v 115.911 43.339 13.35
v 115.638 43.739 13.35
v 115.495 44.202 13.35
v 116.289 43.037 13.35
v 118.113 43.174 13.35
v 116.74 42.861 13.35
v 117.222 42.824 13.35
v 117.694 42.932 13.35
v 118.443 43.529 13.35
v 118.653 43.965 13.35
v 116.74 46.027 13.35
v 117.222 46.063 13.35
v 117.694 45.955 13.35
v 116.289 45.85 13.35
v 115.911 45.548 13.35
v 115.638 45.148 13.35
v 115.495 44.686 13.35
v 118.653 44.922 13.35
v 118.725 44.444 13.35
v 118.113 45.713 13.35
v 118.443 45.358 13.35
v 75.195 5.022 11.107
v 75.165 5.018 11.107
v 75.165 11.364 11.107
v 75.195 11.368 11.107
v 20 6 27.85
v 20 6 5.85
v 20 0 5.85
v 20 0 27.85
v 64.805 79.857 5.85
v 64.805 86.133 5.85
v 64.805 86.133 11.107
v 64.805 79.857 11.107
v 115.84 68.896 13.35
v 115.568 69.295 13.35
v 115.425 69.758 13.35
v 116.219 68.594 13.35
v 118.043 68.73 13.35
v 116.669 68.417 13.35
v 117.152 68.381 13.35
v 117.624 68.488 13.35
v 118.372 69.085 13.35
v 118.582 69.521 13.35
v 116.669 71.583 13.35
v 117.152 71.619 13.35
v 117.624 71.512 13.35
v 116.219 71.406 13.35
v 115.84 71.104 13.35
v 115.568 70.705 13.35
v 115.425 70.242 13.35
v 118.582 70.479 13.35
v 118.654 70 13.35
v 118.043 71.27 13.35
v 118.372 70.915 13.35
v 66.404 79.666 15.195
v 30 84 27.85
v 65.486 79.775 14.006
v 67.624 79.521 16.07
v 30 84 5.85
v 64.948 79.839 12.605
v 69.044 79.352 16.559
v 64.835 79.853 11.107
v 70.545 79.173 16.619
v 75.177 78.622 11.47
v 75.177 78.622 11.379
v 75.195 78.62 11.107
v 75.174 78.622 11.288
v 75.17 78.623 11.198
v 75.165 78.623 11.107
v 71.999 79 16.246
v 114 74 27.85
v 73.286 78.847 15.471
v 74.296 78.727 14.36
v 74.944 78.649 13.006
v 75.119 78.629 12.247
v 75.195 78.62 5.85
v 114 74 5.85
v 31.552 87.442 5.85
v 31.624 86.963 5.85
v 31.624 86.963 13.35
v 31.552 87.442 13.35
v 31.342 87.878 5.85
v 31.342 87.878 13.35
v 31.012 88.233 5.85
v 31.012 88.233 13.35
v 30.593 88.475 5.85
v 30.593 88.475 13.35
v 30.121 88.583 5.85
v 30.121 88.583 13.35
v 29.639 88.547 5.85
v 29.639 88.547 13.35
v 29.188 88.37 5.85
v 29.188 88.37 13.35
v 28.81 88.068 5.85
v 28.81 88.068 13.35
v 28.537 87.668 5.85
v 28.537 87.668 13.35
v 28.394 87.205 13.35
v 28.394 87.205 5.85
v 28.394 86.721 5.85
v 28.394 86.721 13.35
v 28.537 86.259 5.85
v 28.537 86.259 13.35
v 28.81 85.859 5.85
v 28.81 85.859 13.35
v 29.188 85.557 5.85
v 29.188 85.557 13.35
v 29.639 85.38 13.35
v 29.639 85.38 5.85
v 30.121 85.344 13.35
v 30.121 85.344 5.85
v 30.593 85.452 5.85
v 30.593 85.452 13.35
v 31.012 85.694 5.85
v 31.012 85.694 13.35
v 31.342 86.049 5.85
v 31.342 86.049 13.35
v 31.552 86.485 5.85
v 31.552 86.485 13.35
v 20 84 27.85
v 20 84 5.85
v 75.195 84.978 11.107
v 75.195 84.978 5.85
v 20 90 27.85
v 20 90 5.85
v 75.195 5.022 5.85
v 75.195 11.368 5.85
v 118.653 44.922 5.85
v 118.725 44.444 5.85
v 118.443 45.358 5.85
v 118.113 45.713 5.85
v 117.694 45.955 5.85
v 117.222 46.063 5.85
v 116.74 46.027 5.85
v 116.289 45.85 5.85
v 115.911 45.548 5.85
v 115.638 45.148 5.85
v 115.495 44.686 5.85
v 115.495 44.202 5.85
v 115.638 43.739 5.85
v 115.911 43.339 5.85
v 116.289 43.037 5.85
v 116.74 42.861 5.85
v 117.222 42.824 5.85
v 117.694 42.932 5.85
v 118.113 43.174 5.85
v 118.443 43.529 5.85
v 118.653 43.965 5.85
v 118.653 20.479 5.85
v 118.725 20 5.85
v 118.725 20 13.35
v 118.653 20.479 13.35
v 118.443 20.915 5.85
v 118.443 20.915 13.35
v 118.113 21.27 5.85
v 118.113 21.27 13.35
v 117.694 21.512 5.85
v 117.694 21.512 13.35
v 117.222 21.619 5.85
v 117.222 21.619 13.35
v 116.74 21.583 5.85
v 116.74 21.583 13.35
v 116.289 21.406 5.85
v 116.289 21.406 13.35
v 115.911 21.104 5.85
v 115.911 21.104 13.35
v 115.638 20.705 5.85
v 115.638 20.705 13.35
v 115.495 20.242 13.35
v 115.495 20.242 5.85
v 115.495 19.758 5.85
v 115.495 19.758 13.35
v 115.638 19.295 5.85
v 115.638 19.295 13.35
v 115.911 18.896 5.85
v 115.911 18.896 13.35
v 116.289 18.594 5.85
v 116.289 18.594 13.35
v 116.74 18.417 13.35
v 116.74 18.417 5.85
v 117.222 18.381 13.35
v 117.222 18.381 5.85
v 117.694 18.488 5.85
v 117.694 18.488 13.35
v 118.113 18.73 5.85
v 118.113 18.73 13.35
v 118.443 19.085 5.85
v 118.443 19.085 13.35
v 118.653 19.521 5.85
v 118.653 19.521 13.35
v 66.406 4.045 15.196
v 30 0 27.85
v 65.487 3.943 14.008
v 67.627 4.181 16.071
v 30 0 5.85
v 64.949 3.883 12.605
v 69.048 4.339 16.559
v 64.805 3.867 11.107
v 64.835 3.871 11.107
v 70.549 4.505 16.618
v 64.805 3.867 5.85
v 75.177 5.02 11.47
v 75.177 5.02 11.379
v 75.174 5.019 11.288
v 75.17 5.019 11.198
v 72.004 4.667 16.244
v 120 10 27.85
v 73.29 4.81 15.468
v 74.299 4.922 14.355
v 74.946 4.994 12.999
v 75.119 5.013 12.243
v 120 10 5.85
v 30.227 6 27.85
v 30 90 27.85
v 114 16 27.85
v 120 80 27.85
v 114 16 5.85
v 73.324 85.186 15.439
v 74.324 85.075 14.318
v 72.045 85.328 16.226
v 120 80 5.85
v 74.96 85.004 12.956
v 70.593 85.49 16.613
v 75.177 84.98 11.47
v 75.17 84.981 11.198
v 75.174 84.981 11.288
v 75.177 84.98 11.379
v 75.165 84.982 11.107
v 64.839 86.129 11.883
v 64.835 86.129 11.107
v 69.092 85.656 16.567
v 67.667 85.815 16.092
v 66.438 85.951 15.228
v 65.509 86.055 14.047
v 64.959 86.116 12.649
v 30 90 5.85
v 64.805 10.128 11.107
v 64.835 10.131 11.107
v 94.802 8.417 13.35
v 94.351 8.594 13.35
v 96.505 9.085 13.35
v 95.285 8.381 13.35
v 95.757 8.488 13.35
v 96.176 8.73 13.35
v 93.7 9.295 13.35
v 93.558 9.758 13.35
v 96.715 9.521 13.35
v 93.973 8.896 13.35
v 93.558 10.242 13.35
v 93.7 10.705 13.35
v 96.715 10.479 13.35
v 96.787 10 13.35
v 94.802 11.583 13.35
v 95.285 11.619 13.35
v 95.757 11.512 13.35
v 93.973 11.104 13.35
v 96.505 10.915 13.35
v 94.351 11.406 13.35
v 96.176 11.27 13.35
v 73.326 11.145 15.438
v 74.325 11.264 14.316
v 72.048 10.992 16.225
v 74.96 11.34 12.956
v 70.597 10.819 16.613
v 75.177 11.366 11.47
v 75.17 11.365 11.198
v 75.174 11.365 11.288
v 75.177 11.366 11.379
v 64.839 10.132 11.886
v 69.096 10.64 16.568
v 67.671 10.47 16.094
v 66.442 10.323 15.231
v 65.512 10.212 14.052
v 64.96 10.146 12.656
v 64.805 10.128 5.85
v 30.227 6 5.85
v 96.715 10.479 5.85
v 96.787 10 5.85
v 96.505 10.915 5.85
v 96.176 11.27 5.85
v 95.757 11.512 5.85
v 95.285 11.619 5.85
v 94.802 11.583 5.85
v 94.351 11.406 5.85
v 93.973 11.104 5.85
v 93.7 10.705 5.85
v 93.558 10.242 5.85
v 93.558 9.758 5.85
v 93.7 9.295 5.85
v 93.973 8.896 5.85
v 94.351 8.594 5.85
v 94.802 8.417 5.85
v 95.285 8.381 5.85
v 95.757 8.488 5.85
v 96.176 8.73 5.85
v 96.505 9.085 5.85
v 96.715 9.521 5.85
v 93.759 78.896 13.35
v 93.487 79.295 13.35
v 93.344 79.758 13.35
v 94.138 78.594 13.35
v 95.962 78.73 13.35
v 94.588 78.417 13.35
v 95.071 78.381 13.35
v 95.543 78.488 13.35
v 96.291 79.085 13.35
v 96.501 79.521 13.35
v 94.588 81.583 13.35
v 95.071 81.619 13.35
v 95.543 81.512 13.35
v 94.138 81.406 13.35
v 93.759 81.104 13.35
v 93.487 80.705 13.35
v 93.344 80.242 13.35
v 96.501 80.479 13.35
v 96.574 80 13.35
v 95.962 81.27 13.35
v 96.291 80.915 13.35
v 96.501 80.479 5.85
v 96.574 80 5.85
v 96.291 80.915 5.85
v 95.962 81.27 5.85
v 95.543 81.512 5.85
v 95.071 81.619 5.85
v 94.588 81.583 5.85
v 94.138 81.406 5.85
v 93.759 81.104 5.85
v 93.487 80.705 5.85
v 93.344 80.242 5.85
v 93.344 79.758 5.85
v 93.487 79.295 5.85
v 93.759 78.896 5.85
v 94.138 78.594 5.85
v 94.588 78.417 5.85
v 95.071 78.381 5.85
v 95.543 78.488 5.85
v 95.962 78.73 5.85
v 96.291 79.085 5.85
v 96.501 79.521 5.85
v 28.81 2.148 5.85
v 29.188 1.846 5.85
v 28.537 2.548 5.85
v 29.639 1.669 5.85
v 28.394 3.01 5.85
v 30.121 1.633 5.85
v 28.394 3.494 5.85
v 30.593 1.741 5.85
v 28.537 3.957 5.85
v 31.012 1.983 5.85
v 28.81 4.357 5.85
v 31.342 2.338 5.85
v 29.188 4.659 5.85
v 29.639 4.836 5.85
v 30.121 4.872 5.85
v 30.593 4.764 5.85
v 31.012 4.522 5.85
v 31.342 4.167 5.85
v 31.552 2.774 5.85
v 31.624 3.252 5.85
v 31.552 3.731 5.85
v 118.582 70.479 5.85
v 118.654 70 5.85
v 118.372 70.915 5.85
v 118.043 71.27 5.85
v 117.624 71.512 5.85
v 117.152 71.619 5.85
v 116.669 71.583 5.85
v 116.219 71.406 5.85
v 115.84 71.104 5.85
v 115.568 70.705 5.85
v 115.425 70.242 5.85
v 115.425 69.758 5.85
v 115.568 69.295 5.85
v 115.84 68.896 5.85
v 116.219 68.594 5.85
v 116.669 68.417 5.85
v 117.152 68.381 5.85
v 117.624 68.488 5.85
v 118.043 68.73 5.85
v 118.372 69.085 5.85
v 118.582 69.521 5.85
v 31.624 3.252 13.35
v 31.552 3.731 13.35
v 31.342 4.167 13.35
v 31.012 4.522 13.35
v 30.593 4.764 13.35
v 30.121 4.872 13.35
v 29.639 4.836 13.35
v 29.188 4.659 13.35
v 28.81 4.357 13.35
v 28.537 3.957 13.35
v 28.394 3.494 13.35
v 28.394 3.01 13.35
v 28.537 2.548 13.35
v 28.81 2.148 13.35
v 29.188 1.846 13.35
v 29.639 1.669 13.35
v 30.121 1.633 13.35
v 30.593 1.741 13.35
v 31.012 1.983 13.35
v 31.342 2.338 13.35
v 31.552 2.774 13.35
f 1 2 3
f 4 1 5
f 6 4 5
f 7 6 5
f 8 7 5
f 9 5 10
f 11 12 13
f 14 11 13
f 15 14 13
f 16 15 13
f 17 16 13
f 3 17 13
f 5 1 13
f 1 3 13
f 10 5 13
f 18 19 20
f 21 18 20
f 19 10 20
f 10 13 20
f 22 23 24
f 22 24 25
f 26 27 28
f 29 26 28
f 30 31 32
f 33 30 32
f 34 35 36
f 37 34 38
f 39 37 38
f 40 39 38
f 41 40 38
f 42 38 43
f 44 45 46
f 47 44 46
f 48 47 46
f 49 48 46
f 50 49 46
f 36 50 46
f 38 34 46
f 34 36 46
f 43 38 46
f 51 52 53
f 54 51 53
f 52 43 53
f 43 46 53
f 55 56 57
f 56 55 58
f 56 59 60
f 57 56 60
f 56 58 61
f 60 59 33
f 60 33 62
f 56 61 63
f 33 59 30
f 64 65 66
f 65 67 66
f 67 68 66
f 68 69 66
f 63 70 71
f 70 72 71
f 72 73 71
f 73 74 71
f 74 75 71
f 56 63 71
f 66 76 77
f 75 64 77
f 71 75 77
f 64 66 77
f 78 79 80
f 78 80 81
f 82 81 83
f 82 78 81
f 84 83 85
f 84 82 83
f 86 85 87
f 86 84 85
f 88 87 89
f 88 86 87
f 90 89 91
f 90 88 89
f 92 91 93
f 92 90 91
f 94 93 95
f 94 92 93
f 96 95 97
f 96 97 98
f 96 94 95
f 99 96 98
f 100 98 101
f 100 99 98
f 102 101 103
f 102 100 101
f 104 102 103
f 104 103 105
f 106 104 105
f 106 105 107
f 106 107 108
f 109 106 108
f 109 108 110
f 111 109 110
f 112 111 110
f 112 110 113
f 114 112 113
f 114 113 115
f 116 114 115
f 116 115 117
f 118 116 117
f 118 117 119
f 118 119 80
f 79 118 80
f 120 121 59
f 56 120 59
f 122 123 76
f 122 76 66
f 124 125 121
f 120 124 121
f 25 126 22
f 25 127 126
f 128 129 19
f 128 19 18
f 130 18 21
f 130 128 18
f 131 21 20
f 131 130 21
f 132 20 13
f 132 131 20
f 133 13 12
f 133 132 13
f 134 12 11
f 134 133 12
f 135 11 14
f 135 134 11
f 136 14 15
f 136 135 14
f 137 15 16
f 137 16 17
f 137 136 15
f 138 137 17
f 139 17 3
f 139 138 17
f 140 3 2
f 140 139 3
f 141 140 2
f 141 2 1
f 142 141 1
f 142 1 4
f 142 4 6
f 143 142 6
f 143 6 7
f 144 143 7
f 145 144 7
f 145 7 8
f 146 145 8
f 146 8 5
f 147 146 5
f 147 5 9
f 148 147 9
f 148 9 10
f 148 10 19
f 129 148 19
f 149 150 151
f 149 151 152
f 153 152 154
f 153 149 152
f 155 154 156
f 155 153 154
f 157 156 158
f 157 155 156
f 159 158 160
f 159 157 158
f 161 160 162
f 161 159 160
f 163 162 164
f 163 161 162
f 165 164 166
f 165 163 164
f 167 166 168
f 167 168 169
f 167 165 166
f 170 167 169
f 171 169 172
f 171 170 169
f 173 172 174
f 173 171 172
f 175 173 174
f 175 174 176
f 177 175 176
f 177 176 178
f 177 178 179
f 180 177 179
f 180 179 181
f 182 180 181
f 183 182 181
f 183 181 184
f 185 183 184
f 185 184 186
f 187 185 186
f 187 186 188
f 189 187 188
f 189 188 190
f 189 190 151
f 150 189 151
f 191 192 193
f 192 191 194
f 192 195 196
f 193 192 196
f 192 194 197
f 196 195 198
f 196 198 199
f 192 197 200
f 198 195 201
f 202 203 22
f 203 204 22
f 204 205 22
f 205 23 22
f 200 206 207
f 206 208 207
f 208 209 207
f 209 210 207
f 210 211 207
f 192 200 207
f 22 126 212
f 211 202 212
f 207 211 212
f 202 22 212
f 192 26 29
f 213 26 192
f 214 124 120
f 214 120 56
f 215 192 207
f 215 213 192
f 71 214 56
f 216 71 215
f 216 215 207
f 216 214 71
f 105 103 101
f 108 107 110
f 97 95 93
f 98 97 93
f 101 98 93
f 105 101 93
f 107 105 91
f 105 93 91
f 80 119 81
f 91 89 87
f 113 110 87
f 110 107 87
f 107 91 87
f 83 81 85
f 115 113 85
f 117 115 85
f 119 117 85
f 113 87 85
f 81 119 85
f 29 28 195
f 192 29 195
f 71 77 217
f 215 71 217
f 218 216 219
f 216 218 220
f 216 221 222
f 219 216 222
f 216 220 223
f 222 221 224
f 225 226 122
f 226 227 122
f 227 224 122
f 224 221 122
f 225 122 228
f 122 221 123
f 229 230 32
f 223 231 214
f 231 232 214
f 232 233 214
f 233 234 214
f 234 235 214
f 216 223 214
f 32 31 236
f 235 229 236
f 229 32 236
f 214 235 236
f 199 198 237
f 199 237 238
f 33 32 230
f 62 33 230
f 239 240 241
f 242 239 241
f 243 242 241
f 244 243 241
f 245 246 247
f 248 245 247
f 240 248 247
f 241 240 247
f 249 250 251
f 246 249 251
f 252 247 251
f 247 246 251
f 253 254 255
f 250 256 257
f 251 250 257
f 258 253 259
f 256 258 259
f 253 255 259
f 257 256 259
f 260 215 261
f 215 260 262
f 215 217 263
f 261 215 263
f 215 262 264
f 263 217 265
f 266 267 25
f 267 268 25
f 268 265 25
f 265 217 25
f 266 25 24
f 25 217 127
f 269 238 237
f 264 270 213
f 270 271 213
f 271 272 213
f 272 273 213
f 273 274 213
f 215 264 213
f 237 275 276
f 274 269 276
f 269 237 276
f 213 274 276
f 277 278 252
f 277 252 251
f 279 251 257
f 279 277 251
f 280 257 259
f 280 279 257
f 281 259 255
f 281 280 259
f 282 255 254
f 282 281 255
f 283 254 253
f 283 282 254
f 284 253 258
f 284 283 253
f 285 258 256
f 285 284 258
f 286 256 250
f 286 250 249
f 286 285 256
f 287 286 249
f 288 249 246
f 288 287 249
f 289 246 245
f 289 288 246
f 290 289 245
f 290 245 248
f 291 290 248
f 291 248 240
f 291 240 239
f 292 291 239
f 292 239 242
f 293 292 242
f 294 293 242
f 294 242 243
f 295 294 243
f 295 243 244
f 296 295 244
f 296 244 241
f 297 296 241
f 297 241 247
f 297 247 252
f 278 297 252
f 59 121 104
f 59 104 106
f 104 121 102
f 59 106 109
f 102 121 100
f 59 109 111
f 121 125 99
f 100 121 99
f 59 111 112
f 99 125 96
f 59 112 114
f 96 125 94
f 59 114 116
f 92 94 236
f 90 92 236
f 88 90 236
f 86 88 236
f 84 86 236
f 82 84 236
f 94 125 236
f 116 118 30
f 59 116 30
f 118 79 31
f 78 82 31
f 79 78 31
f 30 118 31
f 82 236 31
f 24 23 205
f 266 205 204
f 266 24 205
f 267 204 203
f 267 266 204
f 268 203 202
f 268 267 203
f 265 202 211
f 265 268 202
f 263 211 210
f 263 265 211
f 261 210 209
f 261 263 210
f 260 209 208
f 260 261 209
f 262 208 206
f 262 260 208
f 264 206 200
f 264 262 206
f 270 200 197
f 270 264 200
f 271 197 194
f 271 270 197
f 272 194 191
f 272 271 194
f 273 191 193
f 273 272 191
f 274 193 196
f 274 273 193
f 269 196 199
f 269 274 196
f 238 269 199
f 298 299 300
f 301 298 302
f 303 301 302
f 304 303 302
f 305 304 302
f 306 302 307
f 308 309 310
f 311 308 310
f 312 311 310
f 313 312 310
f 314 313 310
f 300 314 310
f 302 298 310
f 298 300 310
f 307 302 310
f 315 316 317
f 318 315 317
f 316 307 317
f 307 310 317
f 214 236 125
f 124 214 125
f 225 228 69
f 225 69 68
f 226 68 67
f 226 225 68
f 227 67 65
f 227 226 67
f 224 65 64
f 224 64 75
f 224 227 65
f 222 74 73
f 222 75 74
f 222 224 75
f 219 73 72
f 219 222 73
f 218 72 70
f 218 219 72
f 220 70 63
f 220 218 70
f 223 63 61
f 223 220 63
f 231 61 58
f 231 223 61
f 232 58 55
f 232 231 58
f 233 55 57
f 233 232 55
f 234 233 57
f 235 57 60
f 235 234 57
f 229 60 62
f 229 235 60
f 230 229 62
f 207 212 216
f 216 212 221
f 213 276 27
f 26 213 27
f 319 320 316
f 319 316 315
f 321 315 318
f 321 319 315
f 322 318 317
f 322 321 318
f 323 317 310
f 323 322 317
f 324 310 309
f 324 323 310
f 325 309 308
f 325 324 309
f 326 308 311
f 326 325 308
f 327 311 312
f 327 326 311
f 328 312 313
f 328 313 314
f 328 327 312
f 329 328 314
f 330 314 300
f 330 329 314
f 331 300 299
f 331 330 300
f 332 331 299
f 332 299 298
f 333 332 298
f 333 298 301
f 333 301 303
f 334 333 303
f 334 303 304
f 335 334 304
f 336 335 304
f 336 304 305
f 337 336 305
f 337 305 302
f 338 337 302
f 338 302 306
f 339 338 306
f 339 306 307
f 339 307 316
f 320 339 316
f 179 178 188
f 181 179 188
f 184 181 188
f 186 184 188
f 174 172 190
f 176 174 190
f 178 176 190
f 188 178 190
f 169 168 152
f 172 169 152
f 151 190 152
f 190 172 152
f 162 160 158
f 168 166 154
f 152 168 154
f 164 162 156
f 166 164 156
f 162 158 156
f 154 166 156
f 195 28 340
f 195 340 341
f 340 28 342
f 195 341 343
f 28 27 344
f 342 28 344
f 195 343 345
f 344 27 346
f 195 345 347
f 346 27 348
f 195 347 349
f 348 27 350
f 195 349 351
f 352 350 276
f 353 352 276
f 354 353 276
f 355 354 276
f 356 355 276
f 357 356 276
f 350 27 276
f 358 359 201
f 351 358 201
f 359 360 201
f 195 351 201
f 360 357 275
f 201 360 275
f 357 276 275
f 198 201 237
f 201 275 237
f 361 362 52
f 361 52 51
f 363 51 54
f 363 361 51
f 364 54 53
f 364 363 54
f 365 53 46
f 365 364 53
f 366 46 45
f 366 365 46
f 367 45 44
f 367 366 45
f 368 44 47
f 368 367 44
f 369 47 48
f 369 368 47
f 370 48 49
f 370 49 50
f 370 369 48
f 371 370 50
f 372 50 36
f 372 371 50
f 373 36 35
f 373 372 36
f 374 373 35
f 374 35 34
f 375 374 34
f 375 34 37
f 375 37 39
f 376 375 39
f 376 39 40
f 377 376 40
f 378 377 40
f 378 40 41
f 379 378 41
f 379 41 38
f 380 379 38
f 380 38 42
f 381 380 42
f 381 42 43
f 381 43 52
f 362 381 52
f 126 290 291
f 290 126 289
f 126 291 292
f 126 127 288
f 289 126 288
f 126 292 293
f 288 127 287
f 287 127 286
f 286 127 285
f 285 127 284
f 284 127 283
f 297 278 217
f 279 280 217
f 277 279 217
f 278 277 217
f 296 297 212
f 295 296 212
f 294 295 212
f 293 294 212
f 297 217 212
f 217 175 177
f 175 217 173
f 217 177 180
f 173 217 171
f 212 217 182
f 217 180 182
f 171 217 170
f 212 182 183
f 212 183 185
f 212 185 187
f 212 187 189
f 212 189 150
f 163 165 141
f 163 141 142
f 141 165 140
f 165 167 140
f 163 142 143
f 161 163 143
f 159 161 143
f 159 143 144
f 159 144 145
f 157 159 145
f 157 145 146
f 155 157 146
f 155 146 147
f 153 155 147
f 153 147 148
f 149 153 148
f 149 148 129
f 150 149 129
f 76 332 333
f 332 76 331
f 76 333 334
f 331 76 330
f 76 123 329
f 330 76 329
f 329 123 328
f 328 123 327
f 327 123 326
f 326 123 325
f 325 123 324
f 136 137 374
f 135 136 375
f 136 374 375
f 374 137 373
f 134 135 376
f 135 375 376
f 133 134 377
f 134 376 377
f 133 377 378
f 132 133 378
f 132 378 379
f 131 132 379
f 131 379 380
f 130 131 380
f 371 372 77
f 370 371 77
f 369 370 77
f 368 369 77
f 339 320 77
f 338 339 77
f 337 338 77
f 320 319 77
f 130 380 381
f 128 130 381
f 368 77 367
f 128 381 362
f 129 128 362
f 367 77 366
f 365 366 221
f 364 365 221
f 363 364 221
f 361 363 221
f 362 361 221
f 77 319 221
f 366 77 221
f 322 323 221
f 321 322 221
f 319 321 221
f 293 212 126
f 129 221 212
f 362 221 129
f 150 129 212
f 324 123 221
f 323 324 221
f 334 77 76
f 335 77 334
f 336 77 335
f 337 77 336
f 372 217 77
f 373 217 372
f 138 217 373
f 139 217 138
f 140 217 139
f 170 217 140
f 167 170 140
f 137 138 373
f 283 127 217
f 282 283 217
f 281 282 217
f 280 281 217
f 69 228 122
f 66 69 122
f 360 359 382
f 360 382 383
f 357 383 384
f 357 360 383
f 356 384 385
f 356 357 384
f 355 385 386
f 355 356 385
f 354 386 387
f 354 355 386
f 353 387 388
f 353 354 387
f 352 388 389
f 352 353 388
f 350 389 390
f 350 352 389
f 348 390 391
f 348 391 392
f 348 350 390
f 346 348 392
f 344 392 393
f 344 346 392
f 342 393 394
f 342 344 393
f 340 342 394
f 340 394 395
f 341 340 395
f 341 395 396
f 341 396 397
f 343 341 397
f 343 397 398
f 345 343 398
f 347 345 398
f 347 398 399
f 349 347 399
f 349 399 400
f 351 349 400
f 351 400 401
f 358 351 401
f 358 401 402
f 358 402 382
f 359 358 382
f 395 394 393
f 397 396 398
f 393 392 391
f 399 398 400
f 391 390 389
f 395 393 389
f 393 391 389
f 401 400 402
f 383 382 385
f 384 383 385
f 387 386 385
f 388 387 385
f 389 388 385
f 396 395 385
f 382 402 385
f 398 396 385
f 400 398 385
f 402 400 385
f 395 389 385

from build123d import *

# Parameters (mm, degrees)
SKETCH044_W      = 10.390858
SKETCH044_H      = 5.392216
EXTRUDE047_DEPTH = 100
SKETCH179_R      = 1.623797
EXTRUDE196_DEPTH = 10
SKETCH178_R      = 5.177463
EXTRUDE195_DEPTH = 800
EXTRUDE194_DEPTH = 22


with BuildPart() as extrude047:
    # Sketch044 → Extrude047 (new body)
    with BuildSketch(Plane.XZ):
        with Locations((70, -7.3389)):
            Rectangle(SKETCH044_W, SKETCH044_H)
    extrude(amount=EXTRUDE047_DEPTH)


with BuildPart() as extrude047_1:
    # Extrude047 placement: moved
    add(extrude047.part.moved(Location((0, 96.2, 0))))


with BuildPart() as extrude196:
    # Sketch179 → Extrude196 (new body)
    with BuildSketch(Plane.XY.offset(12.1)):
        with Locations((30, 86.963425)):
            Circle(SKETCH179_R)
        with Locations((30, 3.252438)):
            Circle(SKETCH179_R)
        with Locations((95.163345, 10)):
            Circle(SKETCH179_R)
        with Locations((94.949776, 80)):
            Circle(SKETCH179_R)
        with Locations((117.10096, 20)):
            Circle(SKETCH179_R)
        with Locations((117.030609, 70)):
            Circle(SKETCH179_R)
        with Locations((117.10096, 44.443623)):
            Circle(SKETCH179_R)
    extrude(amount=EXTRUDE196_DEPTH)


with BuildPart() as extrude196_1:
    # Extrude196 placement: moved
    add(extrude196.part.moved(Location((0, 0, -24.5))))


with BuildPart() as extrude195:
    # Sketch178 → Extrude195 (new body)
    with BuildSketch(Plane.XZ):
        with Locations((70, 3.62)):
            Circle(SKETCH178_R)
    extrude(amount=EXTRUDE195_DEPTH)


with BuildPart() as extrude195_1:
    # Extrude195 placement: moved
    add(extrude195.part.moved(Location((0, 293, 0))))


with BuildPart() as carvasa:
    # Sketch177 → Extrude194 (new body)
    with BuildSketch(Plane.XY):
        Polygon((30, 0), (120, 10), (120, 80), (30, 90), (20, 90), (20, 84), (30, 84), (114, 74), (114, 16), (30.22679, 6), (20, 6), (20, 0), align=None)
    extrude(amount=EXTRUDE194_DEPTH)


with BuildPart() as carvasa_1:
    # Extrude194 placement: moved
    add(carvasa.part.moved(Location((0, 0, -2))))

    # Cut123: cut Extrude195
    add(extrude195_1.part, mode=Mode.SUBTRACT)


with BuildPart() as carvasa_2:
    # Cut123 placement: moved
    add(carvasa_1.part.moved(Location((0, 0, -7.9))))

    # Cut015: cut Extrude196
    add(extrude196_1.part, mode=Mode.SUBTRACT)

    # Cut016: cut Extrude047
    add(extrude047_1.part, mode=Mode.SUBTRACT)


with BuildPart() as carvasa_3:
    # Cut016 placement: moved
    add(carvasa_2.part.moved(Location((0, 0, 15.75))))


solid = carvasa_3.part
